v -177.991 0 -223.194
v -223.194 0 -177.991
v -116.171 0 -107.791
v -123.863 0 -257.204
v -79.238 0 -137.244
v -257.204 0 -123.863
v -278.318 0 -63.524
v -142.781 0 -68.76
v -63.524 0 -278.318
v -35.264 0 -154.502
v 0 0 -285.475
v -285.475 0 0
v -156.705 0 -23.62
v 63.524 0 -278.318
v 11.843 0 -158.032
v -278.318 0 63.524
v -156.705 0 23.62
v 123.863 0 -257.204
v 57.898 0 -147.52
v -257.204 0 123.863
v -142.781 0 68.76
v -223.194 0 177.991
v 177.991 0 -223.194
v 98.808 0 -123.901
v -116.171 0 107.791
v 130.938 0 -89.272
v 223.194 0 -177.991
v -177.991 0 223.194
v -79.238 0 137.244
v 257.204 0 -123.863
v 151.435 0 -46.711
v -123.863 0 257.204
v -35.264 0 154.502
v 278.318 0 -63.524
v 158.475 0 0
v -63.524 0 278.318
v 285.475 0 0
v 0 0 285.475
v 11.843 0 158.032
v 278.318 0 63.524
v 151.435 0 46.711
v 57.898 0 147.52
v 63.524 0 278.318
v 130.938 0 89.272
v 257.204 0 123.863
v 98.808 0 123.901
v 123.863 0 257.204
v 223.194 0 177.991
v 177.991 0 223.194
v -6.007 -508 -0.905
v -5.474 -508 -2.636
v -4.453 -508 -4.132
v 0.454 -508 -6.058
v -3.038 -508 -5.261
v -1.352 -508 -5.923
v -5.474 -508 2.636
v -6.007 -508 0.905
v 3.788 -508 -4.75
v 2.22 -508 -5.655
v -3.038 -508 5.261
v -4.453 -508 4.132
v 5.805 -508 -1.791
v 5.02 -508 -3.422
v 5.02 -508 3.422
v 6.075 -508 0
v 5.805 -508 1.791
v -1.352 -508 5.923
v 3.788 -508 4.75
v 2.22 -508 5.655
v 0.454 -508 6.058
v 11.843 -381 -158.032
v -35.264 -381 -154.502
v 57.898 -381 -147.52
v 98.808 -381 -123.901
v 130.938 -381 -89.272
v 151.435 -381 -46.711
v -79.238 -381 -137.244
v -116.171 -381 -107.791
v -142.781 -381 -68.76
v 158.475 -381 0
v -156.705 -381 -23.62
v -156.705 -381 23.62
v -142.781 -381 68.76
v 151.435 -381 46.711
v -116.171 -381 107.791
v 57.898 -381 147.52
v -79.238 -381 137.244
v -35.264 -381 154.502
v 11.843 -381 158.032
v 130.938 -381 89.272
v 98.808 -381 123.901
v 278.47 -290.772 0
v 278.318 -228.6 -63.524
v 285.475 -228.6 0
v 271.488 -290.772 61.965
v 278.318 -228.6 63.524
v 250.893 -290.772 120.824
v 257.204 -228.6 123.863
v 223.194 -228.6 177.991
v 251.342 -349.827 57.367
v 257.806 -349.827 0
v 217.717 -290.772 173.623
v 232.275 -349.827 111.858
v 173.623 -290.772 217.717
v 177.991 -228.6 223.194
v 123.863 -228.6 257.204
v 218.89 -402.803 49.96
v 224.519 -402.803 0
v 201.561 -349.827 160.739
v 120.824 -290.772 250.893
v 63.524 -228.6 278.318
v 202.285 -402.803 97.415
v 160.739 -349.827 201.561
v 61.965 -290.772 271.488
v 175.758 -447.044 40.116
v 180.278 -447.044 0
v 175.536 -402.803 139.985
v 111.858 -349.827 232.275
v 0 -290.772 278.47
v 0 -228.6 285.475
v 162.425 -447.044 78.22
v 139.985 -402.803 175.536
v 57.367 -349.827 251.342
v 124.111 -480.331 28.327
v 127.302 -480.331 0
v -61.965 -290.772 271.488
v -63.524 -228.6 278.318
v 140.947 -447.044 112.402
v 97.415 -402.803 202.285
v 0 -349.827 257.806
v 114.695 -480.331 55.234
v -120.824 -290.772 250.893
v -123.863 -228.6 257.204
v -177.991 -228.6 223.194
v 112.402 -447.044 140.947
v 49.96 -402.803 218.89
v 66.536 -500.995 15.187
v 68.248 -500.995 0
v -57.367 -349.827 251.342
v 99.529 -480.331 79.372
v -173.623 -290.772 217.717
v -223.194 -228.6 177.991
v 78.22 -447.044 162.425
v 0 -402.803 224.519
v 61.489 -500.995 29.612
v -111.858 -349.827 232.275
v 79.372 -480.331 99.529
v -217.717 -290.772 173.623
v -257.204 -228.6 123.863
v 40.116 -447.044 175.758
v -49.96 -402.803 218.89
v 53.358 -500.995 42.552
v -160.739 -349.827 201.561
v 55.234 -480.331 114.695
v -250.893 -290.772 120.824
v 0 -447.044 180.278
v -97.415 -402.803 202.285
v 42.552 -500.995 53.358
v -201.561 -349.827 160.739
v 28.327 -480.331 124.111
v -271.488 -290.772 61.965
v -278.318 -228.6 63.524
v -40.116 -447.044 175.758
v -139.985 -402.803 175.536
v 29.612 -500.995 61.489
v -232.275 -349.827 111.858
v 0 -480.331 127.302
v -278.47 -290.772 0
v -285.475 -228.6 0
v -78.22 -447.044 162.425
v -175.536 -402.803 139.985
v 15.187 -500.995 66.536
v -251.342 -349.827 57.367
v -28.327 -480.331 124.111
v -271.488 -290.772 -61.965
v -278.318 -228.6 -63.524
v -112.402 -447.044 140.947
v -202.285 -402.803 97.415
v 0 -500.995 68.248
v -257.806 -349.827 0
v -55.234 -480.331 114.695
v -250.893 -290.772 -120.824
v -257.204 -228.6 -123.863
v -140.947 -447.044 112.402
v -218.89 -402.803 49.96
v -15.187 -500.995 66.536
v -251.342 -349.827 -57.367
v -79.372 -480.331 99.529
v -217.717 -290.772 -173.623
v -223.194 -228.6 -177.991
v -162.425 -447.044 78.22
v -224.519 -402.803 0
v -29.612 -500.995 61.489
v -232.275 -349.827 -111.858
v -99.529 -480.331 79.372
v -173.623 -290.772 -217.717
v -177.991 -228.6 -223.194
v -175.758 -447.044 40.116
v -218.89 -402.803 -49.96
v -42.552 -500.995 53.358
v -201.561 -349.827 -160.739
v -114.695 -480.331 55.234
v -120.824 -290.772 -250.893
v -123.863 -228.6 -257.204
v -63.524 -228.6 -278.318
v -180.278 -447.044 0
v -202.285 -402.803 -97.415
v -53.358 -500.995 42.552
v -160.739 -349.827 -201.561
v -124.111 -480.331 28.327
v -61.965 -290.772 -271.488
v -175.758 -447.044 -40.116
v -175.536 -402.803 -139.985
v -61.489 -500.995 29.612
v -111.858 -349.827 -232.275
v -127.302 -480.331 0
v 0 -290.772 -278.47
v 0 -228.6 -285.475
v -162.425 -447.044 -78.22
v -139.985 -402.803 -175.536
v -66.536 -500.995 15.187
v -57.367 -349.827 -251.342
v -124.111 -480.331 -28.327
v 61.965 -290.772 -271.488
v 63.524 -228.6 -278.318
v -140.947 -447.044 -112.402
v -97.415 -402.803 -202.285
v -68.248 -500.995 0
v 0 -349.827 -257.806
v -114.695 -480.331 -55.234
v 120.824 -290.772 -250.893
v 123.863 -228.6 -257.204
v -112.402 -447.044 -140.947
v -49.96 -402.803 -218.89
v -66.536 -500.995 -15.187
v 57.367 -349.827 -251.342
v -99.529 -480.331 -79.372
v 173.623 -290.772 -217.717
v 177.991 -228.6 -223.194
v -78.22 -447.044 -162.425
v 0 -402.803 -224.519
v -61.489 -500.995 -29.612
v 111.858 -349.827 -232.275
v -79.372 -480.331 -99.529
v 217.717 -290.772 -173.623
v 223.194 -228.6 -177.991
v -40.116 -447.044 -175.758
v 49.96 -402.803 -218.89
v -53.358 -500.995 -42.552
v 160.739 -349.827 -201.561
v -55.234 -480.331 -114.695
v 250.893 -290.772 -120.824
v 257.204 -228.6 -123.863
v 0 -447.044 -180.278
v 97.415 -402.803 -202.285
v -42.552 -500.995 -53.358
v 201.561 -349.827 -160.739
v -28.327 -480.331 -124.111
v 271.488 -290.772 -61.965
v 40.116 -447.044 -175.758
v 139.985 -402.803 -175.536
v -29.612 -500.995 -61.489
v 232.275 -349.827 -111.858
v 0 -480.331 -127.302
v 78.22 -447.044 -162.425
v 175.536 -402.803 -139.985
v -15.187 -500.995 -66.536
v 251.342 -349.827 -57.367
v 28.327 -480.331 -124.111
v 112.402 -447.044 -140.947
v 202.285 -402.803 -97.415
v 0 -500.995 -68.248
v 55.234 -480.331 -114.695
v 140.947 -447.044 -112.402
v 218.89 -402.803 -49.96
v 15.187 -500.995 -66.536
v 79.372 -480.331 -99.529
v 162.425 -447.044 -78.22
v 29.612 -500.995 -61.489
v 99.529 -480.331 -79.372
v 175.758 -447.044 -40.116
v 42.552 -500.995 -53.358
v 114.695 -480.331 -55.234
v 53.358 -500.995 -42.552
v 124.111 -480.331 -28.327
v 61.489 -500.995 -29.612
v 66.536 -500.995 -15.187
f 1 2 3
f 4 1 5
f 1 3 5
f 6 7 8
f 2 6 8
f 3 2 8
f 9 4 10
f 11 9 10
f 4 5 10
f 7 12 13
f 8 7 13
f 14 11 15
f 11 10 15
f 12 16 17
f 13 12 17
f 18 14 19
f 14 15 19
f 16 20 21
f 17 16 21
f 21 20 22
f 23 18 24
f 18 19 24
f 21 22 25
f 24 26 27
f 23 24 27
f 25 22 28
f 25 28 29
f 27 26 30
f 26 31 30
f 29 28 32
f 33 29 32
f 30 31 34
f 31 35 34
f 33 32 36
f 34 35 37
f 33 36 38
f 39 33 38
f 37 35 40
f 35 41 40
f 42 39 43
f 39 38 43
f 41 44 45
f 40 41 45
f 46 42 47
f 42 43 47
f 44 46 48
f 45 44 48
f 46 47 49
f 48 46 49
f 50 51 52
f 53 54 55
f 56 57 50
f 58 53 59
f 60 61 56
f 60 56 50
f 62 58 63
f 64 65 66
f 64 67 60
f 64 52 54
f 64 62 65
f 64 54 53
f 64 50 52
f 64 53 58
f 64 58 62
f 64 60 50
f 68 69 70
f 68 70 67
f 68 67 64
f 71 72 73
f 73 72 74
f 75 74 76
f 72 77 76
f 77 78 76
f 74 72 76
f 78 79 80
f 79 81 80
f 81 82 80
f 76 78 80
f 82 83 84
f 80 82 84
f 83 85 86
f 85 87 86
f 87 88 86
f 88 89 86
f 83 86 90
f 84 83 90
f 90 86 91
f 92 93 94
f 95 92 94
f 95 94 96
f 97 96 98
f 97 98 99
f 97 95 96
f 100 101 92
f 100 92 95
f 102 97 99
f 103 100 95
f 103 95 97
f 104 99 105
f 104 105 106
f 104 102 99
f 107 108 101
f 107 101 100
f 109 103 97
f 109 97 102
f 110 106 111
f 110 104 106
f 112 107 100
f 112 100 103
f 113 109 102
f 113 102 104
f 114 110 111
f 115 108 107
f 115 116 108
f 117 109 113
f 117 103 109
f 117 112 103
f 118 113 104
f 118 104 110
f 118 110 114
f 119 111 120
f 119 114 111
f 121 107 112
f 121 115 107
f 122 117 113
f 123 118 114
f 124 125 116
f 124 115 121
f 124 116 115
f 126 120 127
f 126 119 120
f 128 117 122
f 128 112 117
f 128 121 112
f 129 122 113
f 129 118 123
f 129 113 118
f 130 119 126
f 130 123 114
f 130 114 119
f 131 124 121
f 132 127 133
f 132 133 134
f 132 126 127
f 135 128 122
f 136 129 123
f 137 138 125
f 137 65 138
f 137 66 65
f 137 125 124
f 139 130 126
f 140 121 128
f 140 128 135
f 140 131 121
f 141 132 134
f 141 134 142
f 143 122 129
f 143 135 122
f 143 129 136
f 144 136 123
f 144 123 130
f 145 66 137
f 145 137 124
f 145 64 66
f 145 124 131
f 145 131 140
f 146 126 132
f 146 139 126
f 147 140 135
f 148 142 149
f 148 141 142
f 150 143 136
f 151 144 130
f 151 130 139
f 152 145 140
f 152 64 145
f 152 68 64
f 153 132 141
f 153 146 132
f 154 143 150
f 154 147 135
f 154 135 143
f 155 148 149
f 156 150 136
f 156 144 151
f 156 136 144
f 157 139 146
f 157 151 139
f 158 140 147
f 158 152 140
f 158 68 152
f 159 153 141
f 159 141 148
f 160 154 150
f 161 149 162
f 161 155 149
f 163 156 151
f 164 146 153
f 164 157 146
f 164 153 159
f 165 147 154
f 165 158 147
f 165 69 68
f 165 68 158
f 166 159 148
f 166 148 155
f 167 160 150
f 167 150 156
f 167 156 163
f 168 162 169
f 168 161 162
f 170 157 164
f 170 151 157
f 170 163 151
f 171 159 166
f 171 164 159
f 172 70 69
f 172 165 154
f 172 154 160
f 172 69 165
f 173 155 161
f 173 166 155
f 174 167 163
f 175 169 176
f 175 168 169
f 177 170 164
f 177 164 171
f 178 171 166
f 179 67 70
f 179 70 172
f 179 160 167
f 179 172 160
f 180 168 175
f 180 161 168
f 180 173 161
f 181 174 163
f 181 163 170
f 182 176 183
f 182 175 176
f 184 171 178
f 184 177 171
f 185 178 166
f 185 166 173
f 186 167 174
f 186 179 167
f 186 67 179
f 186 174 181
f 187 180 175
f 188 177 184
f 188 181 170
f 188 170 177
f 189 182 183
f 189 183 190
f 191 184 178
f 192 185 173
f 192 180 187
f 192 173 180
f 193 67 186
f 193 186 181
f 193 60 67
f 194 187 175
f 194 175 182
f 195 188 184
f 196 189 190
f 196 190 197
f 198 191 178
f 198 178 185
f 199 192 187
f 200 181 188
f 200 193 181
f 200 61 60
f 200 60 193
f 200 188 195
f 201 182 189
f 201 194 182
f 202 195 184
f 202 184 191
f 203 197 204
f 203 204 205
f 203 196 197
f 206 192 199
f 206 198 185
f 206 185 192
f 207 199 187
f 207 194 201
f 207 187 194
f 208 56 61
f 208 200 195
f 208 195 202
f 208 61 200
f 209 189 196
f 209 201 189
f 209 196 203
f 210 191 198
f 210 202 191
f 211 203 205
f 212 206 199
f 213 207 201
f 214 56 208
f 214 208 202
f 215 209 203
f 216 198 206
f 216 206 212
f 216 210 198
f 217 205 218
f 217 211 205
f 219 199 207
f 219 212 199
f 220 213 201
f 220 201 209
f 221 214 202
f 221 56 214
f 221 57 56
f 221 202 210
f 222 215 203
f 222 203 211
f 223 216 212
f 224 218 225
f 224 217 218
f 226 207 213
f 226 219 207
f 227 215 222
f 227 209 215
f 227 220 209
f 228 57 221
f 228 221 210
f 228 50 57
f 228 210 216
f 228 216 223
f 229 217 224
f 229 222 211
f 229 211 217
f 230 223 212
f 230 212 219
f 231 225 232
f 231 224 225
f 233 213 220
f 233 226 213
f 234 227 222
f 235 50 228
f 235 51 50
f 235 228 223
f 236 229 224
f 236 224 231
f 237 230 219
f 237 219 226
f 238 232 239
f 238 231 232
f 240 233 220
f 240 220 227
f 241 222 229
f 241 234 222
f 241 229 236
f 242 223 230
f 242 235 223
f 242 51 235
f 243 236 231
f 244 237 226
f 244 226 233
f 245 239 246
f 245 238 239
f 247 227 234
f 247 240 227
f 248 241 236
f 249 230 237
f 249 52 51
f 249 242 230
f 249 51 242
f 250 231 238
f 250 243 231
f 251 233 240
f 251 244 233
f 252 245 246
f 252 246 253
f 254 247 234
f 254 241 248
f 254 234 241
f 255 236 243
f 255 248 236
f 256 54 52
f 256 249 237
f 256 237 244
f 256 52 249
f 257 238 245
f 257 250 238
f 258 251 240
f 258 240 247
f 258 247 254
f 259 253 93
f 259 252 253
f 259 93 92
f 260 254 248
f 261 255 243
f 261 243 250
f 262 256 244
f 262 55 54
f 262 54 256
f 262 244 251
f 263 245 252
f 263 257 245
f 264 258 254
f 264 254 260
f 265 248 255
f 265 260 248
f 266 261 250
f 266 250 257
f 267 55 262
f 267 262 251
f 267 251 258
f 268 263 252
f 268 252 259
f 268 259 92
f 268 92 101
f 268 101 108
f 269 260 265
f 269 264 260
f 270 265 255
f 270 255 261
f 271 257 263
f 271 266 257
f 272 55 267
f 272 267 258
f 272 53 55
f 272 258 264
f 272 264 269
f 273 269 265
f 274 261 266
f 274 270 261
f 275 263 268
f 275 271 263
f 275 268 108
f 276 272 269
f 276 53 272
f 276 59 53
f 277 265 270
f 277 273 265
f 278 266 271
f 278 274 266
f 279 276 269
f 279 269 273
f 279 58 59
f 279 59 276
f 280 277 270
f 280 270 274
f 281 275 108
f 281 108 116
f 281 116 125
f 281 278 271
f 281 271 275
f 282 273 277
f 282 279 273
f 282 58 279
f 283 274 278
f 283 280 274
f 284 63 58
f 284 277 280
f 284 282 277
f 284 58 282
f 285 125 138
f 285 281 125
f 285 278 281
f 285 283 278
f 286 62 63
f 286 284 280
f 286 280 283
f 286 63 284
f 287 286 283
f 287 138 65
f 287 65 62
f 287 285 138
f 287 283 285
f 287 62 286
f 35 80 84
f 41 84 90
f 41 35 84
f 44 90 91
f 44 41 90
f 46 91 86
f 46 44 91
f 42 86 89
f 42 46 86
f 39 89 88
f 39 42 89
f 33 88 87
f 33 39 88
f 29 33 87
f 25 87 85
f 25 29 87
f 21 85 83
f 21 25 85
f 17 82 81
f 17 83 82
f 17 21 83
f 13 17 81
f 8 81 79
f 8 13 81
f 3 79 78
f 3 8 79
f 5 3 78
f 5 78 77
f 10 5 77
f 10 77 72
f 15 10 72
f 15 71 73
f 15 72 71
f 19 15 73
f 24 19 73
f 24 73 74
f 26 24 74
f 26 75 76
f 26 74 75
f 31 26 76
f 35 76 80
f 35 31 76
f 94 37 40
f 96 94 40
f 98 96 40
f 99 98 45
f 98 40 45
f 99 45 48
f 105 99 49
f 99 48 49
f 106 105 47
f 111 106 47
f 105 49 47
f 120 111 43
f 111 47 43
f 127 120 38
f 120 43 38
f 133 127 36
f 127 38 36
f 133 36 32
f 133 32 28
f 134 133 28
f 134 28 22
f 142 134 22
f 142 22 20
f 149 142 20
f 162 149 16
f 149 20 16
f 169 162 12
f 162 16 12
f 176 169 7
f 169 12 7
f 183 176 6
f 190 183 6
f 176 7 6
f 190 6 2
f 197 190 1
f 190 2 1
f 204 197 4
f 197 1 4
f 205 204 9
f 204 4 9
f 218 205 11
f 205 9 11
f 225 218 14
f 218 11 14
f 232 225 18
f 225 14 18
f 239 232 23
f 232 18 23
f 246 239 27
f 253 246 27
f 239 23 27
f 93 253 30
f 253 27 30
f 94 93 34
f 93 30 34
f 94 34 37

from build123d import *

# Parameters (mm, degrees)
F0_R     = 285.475239
F1_DEPTH = 508
F2_T     = -127
F3_R     = 279.4


with BuildPart() as f1:
    # F0 (on Front) → F1 (new body)
    with BuildSketch(Plane.XZ):
        Circle(F0_R)
    extrude(amount=F1_DEPTH)

    # F2
    f2_openings = [f1.faces().sort_by_distance(p)[0] for p in [
        (0, 0, 0),
    ]]
    offset(amount=F2_T, openings=f2_openings)

    # F3
    f3_edges = [f1.edges().sort_by_distance(p)[0] for p in [
        (-285.475239, -508, 0),
    ]]
    fillet(f3_edges, radius=F3_R)


solid = f1.part
